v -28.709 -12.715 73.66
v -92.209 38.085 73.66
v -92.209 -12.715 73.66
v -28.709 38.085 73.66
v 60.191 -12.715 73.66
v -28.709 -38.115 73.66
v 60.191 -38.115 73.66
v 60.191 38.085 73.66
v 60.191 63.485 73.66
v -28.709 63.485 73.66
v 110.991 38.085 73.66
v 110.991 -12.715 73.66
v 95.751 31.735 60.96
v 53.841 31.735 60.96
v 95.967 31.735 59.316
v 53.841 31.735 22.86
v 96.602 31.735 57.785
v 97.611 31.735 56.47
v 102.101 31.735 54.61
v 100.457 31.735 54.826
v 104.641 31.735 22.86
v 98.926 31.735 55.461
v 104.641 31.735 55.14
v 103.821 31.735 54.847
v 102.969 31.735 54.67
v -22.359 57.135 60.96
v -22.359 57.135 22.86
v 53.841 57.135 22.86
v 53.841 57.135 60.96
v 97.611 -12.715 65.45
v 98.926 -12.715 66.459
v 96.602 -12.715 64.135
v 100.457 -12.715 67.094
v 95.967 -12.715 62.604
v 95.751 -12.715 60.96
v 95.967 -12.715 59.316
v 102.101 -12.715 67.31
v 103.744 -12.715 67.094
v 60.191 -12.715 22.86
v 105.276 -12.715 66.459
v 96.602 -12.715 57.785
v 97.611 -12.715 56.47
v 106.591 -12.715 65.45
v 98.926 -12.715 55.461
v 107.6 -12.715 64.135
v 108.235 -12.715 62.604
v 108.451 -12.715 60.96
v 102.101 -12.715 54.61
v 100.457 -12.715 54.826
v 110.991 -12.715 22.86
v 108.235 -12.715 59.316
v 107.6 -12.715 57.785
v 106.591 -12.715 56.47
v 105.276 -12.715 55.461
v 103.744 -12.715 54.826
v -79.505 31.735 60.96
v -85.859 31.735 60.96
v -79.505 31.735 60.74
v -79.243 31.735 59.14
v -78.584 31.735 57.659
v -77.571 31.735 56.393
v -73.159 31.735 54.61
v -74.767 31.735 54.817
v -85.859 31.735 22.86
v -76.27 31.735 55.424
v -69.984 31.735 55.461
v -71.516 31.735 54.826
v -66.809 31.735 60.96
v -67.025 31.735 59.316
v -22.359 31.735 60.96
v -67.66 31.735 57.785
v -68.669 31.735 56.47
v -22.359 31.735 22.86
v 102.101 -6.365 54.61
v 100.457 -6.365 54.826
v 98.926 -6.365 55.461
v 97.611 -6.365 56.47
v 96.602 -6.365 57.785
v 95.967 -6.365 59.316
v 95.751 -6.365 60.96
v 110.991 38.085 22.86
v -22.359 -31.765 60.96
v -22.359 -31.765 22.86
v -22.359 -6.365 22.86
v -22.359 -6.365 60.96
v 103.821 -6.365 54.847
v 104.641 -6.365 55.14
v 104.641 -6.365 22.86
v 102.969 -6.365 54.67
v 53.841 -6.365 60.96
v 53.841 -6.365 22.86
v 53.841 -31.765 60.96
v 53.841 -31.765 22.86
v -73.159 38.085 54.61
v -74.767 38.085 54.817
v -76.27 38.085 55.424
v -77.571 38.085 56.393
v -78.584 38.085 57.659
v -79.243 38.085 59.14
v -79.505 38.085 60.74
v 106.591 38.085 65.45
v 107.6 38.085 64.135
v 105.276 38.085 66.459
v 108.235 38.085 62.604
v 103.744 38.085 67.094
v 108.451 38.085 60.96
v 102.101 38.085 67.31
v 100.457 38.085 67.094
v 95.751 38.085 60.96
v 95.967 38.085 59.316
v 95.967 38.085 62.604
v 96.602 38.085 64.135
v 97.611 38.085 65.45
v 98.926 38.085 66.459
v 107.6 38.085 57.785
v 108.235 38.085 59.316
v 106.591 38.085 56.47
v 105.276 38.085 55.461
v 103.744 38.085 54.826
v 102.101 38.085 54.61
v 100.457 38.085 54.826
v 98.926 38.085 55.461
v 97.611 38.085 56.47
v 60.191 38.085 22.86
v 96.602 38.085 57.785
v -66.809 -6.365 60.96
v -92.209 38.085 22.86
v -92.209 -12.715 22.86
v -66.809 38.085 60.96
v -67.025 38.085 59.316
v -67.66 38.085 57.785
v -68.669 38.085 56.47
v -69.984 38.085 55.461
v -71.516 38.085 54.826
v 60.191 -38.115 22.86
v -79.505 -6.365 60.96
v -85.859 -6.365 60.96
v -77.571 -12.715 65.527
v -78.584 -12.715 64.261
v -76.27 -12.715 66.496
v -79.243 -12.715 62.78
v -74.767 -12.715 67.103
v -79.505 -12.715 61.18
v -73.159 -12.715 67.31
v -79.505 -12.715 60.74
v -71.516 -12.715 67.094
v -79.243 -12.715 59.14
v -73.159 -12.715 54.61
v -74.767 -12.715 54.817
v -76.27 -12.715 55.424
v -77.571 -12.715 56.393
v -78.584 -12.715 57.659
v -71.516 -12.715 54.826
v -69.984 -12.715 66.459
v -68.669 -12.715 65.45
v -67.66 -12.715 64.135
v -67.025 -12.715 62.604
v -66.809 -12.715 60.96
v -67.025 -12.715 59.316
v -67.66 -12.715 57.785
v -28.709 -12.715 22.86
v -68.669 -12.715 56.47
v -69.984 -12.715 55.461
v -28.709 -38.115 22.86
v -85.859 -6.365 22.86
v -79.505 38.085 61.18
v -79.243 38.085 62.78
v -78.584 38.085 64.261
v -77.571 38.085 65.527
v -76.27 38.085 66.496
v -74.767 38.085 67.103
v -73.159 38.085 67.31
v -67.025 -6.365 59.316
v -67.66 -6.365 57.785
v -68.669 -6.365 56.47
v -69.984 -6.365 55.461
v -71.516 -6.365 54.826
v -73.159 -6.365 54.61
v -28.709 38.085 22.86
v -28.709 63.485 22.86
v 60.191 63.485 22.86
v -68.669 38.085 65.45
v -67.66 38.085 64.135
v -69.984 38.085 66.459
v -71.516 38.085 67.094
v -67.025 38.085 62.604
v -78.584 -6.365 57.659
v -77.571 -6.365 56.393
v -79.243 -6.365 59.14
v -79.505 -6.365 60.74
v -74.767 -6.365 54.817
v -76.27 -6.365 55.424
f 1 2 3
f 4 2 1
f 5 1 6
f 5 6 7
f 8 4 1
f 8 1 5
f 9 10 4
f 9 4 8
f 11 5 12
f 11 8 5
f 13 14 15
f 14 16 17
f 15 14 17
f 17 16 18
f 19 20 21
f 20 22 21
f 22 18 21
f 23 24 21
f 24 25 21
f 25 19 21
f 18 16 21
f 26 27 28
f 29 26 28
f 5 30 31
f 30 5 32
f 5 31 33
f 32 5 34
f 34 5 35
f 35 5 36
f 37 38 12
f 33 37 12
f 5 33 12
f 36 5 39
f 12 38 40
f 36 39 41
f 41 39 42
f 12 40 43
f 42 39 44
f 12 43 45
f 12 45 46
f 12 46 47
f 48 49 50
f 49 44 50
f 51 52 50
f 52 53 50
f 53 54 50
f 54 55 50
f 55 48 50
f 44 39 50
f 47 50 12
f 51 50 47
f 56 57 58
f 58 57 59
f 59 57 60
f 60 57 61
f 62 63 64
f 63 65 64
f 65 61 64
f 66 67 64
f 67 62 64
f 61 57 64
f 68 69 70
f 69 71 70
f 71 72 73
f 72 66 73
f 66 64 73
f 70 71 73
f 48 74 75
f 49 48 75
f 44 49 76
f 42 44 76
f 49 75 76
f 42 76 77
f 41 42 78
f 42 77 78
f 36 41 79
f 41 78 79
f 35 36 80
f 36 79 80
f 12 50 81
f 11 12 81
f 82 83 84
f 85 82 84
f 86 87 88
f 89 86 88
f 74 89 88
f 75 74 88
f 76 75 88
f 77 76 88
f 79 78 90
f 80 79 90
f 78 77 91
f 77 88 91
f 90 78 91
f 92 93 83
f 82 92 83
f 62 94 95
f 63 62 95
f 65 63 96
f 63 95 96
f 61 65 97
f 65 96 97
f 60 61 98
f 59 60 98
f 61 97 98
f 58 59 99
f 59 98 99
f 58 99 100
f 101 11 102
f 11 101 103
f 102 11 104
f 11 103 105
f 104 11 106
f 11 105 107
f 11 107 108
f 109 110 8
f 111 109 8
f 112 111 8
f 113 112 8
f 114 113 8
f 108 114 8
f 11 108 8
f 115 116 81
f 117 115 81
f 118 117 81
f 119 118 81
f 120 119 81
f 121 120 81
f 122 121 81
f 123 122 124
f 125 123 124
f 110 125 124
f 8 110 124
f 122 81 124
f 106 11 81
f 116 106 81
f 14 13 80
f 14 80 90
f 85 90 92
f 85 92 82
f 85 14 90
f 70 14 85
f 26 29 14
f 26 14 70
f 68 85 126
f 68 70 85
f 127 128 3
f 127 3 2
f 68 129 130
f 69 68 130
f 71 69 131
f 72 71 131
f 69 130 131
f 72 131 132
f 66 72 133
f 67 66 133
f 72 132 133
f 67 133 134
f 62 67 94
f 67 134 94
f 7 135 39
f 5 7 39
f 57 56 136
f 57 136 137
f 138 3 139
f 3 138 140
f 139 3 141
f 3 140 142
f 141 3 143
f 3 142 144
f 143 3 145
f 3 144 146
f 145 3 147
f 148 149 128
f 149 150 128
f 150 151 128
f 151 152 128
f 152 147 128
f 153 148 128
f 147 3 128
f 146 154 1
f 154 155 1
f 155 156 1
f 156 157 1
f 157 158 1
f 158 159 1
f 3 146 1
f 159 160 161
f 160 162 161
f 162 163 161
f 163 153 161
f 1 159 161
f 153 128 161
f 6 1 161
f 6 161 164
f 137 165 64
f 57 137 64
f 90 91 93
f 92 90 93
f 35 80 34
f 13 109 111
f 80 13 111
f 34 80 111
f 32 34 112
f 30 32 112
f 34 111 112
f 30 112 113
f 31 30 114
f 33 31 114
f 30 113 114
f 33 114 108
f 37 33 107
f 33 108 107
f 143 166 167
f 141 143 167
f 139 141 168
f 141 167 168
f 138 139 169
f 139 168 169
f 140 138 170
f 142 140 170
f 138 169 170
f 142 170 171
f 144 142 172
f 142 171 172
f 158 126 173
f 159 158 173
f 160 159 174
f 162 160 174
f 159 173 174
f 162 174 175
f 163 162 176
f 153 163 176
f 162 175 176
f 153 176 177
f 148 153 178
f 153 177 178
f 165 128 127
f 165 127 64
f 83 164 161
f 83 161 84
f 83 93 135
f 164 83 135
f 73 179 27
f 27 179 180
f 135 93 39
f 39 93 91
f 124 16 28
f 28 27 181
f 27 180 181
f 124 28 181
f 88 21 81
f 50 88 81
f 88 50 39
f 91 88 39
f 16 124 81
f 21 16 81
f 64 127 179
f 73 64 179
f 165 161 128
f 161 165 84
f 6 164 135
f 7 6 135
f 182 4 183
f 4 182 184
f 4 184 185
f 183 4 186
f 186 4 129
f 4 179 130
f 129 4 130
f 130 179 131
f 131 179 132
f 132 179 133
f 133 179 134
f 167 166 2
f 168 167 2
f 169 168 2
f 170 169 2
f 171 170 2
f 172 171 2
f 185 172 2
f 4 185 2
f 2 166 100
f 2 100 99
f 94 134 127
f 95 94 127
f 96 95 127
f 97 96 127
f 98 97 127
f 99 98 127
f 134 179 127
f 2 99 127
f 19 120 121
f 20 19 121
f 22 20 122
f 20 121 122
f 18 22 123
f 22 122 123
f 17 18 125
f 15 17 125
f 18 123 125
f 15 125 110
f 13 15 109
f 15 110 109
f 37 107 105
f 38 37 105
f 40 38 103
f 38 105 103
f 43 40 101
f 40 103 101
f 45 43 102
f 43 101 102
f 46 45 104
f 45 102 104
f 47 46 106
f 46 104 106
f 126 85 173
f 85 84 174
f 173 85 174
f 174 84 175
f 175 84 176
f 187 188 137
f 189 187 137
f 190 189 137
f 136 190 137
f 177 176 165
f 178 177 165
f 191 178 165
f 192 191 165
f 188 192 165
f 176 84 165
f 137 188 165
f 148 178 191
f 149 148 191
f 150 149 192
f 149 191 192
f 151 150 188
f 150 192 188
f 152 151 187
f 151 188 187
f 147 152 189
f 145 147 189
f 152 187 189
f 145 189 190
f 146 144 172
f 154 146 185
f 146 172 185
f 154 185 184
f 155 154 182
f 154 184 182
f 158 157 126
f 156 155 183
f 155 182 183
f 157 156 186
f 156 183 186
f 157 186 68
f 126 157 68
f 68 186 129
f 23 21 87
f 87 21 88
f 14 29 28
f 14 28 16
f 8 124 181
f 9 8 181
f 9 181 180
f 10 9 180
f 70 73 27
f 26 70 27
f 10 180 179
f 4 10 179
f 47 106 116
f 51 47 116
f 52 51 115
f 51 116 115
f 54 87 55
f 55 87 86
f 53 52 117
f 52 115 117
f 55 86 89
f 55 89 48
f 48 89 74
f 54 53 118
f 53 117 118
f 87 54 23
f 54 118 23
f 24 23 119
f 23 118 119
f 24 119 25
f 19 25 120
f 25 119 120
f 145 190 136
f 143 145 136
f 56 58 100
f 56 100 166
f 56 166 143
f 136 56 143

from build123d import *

# Parameters (mm, degrees)
SKETCH2_W               = 6.35
SKETCH2_H               = 50.8
SKETCH2_W_2             = 2.54
SKETCH2_W_3             = 31.75
SKETCH2_W_4             = 3.81
SKETCH2_W_5             = 12.7
BOSS_EXTRUDE2_DEPTH     = 73.66
CUT_EXTRUDE2_DEPTH      = 26.4
CUT_EXTRUDE2_DEPTH_BACK = 77.2
CUT_EXTRUDE3_DEPTH      = 22.86
CUT_EXTRUDE4_DEPTH      = 38.1


with BuildPart() as part:
    # Sketch2 → Boss-Extrude2 (new body)
    with BuildSketch(Plane.XY):
        with Locations((98.925952955, 12.684680338)):
            Rectangle(SKETCH2_W, SKETCH2_H)
        with Locations((105.275952955, 12.684680338)):
            Rectangle(SKETCH2_W, SKETCH2_H)
        with Locations((109.720952955, 12.684680338)):
            Rectangle(SKETCH2_W_2, SKETCH2_H)
        with Locations((79.875952955, 12.684680338)):
            Rectangle(SKETCH2_W_3, SKETCH2_H)
        with Locations((62.095952955, 12.684680338)):
            Rectangle(SKETCH2_W_4, SKETCH2_H)
        Polygon((-28.709047045, -38.115319662), (60.190952955, -38.115319662), (60.190952955, 63.484680338), (-28.709047045, 63.484680338), (-28.709047045, -12.715319662), align=None)
        with Locations((-31.884047045, 12.684680338)):
            Rectangle(SKETCH2_W, SKETCH2_H)
        with Locations((-50.934047045, 12.684680338)):
            Rectangle(SKETCH2_W_3, SKETCH2_H)
        with Locations((-69.984047045, 12.684680338)):
            Rectangle(SKETCH2_W, SKETCH2_H)
        with Locations((-76.334047045, 12.684680338)):
            Rectangle(SKETCH2_W, SKETCH2_H)
        with Locations((-85.859047045, 12.684680338)):
            Rectangle(SKETCH2_W_5, SKETCH2_H)
    extrude(amount=BOSS_EXTRUDE2_DEPTH)

    # Sketch4 → Cut-Extrude2 (cut, two sides)
    with BuildSketch(Plane(origin=(0, 38.084680338, 0), x_dir=(1, 0, 0), z_dir=(0, 1, 0))) as cut_extrude2_sk:
        with BuildLine():
            Line((-73.159047045, -60.96), (-73.159047045, -67.31))
            ThreePointArc((-73.159047045, -67.31), (-68.668918984, -65.450128061), (-66.809047045, -60.96))
            ThreePointArc((-66.809047045, -60.96), (-68.668918984, -56.469871939), (-73.159047045, -54.61))
            Line((-73.159047045, -54.61), (-73.159047045, -60.96))
        make_face()
        with BuildLine():
            Line((-79.50524406, -60.740265064), (-79.50524406, -61.179734936))
            ThreePointArc((-79.50524406, -61.179734936), (-77.57080311, -65.527155397), (-73.159047045, -67.31))
            Line((-73.159047045, -67.31), (-73.159047045, -60.96))
            Line((-73.159047045, -60.96), (-73.159047045, -54.61))
            ThreePointArc((-73.159047045, -54.61), (-77.57080311, -56.392844603), (-79.50524406, -60.740265064))
        make_face()
        with BuildLine():
            ThreePointArc((102.100952955, -54.61), (97.610824895, -56.469871939), (95.750952955, -60.96))
            ThreePointArc((95.750952955, -60.96), (97.610824895, -65.450128061), (102.100952955, -67.31))
            Line((102.100952955, -67.31), (102.100952955, -60.96))
            Line((102.100952955, -60.96), (102.100952955, -54.61))
        make_face()
        with BuildLine():
            ThreePointArc((108.450952955, -60.96), (106.591081016, -56.469871939), (102.100952955, -54.61))
            Line((102.100952955, -54.61), (102.100952955, -60.96))
            Line((102.100952955, -60.96), (102.100952955, -67.31))
            ThreePointArc((102.100952955, -67.31), (106.591081016, -65.450128061), (108.450952955, -60.96))
        make_face()
    extrude(amount=CUT_EXTRUDE2_DEPTH, mode=Mode.SUBTRACT)
    extrude(cut_extrude2_sk.sketch, amount=-CUT_EXTRUDE2_DEPTH_BACK, mode=Mode.SUBTRACT)

    # Sketch5 → Cut-Extrude3 (cut)
    with BuildSketch(Plane(origin=(0, 0, 0), x_dir=(-1, 0, 0), z_dir=(0, 0, -1))):
        Polygon((-60.190952955, -38.115319662), (-60.190952955, -12.715319662), (-110.990952955, -12.715319662), (-110.990952955, 38.084680338), (-60.190952955, 38.084680338), (-60.190952955, 63.484680338), (28.709047045, 63.484680338), (28.709047045, 38.084680338), (92.209047045, 38.084680338), (92.209047045, -12.715319662), (28.709047045, -12.715319662), (28.709047045, -38.115319662), align=None)
    extrude(amount=-CUT_EXTRUDE3_DEPTH, mode=Mode.SUBTRACT)

    # Sketch8 → Cut-Extrude4 (cut)
    with BuildSketch(Plane(origin=(0, 0, 22.86), x_dir=(-1, 0, 0), z_dir=(0, 0, -1))):
        Polygon((-104.640952955, -6.365319662), (-53.840952955, -6.365319662), (-53.840952955, -31.765319662), (22.359047045, -31.765319662), (22.359047045, -6.365319662), (85.859047045, -6.365319662), (85.859047045, 31.734680338), (22.359047045, 31.734680338), (22.359047045, 57.134680338), (-53.840952955, 57.134680338), (-53.840952955, 31.734680338), (-104.640952955, 31.734680338), align=None)
    extrude(amount=-CUT_EXTRUDE4_DEPTH, mode=Mode.SUBTRACT)


solid = part.part
